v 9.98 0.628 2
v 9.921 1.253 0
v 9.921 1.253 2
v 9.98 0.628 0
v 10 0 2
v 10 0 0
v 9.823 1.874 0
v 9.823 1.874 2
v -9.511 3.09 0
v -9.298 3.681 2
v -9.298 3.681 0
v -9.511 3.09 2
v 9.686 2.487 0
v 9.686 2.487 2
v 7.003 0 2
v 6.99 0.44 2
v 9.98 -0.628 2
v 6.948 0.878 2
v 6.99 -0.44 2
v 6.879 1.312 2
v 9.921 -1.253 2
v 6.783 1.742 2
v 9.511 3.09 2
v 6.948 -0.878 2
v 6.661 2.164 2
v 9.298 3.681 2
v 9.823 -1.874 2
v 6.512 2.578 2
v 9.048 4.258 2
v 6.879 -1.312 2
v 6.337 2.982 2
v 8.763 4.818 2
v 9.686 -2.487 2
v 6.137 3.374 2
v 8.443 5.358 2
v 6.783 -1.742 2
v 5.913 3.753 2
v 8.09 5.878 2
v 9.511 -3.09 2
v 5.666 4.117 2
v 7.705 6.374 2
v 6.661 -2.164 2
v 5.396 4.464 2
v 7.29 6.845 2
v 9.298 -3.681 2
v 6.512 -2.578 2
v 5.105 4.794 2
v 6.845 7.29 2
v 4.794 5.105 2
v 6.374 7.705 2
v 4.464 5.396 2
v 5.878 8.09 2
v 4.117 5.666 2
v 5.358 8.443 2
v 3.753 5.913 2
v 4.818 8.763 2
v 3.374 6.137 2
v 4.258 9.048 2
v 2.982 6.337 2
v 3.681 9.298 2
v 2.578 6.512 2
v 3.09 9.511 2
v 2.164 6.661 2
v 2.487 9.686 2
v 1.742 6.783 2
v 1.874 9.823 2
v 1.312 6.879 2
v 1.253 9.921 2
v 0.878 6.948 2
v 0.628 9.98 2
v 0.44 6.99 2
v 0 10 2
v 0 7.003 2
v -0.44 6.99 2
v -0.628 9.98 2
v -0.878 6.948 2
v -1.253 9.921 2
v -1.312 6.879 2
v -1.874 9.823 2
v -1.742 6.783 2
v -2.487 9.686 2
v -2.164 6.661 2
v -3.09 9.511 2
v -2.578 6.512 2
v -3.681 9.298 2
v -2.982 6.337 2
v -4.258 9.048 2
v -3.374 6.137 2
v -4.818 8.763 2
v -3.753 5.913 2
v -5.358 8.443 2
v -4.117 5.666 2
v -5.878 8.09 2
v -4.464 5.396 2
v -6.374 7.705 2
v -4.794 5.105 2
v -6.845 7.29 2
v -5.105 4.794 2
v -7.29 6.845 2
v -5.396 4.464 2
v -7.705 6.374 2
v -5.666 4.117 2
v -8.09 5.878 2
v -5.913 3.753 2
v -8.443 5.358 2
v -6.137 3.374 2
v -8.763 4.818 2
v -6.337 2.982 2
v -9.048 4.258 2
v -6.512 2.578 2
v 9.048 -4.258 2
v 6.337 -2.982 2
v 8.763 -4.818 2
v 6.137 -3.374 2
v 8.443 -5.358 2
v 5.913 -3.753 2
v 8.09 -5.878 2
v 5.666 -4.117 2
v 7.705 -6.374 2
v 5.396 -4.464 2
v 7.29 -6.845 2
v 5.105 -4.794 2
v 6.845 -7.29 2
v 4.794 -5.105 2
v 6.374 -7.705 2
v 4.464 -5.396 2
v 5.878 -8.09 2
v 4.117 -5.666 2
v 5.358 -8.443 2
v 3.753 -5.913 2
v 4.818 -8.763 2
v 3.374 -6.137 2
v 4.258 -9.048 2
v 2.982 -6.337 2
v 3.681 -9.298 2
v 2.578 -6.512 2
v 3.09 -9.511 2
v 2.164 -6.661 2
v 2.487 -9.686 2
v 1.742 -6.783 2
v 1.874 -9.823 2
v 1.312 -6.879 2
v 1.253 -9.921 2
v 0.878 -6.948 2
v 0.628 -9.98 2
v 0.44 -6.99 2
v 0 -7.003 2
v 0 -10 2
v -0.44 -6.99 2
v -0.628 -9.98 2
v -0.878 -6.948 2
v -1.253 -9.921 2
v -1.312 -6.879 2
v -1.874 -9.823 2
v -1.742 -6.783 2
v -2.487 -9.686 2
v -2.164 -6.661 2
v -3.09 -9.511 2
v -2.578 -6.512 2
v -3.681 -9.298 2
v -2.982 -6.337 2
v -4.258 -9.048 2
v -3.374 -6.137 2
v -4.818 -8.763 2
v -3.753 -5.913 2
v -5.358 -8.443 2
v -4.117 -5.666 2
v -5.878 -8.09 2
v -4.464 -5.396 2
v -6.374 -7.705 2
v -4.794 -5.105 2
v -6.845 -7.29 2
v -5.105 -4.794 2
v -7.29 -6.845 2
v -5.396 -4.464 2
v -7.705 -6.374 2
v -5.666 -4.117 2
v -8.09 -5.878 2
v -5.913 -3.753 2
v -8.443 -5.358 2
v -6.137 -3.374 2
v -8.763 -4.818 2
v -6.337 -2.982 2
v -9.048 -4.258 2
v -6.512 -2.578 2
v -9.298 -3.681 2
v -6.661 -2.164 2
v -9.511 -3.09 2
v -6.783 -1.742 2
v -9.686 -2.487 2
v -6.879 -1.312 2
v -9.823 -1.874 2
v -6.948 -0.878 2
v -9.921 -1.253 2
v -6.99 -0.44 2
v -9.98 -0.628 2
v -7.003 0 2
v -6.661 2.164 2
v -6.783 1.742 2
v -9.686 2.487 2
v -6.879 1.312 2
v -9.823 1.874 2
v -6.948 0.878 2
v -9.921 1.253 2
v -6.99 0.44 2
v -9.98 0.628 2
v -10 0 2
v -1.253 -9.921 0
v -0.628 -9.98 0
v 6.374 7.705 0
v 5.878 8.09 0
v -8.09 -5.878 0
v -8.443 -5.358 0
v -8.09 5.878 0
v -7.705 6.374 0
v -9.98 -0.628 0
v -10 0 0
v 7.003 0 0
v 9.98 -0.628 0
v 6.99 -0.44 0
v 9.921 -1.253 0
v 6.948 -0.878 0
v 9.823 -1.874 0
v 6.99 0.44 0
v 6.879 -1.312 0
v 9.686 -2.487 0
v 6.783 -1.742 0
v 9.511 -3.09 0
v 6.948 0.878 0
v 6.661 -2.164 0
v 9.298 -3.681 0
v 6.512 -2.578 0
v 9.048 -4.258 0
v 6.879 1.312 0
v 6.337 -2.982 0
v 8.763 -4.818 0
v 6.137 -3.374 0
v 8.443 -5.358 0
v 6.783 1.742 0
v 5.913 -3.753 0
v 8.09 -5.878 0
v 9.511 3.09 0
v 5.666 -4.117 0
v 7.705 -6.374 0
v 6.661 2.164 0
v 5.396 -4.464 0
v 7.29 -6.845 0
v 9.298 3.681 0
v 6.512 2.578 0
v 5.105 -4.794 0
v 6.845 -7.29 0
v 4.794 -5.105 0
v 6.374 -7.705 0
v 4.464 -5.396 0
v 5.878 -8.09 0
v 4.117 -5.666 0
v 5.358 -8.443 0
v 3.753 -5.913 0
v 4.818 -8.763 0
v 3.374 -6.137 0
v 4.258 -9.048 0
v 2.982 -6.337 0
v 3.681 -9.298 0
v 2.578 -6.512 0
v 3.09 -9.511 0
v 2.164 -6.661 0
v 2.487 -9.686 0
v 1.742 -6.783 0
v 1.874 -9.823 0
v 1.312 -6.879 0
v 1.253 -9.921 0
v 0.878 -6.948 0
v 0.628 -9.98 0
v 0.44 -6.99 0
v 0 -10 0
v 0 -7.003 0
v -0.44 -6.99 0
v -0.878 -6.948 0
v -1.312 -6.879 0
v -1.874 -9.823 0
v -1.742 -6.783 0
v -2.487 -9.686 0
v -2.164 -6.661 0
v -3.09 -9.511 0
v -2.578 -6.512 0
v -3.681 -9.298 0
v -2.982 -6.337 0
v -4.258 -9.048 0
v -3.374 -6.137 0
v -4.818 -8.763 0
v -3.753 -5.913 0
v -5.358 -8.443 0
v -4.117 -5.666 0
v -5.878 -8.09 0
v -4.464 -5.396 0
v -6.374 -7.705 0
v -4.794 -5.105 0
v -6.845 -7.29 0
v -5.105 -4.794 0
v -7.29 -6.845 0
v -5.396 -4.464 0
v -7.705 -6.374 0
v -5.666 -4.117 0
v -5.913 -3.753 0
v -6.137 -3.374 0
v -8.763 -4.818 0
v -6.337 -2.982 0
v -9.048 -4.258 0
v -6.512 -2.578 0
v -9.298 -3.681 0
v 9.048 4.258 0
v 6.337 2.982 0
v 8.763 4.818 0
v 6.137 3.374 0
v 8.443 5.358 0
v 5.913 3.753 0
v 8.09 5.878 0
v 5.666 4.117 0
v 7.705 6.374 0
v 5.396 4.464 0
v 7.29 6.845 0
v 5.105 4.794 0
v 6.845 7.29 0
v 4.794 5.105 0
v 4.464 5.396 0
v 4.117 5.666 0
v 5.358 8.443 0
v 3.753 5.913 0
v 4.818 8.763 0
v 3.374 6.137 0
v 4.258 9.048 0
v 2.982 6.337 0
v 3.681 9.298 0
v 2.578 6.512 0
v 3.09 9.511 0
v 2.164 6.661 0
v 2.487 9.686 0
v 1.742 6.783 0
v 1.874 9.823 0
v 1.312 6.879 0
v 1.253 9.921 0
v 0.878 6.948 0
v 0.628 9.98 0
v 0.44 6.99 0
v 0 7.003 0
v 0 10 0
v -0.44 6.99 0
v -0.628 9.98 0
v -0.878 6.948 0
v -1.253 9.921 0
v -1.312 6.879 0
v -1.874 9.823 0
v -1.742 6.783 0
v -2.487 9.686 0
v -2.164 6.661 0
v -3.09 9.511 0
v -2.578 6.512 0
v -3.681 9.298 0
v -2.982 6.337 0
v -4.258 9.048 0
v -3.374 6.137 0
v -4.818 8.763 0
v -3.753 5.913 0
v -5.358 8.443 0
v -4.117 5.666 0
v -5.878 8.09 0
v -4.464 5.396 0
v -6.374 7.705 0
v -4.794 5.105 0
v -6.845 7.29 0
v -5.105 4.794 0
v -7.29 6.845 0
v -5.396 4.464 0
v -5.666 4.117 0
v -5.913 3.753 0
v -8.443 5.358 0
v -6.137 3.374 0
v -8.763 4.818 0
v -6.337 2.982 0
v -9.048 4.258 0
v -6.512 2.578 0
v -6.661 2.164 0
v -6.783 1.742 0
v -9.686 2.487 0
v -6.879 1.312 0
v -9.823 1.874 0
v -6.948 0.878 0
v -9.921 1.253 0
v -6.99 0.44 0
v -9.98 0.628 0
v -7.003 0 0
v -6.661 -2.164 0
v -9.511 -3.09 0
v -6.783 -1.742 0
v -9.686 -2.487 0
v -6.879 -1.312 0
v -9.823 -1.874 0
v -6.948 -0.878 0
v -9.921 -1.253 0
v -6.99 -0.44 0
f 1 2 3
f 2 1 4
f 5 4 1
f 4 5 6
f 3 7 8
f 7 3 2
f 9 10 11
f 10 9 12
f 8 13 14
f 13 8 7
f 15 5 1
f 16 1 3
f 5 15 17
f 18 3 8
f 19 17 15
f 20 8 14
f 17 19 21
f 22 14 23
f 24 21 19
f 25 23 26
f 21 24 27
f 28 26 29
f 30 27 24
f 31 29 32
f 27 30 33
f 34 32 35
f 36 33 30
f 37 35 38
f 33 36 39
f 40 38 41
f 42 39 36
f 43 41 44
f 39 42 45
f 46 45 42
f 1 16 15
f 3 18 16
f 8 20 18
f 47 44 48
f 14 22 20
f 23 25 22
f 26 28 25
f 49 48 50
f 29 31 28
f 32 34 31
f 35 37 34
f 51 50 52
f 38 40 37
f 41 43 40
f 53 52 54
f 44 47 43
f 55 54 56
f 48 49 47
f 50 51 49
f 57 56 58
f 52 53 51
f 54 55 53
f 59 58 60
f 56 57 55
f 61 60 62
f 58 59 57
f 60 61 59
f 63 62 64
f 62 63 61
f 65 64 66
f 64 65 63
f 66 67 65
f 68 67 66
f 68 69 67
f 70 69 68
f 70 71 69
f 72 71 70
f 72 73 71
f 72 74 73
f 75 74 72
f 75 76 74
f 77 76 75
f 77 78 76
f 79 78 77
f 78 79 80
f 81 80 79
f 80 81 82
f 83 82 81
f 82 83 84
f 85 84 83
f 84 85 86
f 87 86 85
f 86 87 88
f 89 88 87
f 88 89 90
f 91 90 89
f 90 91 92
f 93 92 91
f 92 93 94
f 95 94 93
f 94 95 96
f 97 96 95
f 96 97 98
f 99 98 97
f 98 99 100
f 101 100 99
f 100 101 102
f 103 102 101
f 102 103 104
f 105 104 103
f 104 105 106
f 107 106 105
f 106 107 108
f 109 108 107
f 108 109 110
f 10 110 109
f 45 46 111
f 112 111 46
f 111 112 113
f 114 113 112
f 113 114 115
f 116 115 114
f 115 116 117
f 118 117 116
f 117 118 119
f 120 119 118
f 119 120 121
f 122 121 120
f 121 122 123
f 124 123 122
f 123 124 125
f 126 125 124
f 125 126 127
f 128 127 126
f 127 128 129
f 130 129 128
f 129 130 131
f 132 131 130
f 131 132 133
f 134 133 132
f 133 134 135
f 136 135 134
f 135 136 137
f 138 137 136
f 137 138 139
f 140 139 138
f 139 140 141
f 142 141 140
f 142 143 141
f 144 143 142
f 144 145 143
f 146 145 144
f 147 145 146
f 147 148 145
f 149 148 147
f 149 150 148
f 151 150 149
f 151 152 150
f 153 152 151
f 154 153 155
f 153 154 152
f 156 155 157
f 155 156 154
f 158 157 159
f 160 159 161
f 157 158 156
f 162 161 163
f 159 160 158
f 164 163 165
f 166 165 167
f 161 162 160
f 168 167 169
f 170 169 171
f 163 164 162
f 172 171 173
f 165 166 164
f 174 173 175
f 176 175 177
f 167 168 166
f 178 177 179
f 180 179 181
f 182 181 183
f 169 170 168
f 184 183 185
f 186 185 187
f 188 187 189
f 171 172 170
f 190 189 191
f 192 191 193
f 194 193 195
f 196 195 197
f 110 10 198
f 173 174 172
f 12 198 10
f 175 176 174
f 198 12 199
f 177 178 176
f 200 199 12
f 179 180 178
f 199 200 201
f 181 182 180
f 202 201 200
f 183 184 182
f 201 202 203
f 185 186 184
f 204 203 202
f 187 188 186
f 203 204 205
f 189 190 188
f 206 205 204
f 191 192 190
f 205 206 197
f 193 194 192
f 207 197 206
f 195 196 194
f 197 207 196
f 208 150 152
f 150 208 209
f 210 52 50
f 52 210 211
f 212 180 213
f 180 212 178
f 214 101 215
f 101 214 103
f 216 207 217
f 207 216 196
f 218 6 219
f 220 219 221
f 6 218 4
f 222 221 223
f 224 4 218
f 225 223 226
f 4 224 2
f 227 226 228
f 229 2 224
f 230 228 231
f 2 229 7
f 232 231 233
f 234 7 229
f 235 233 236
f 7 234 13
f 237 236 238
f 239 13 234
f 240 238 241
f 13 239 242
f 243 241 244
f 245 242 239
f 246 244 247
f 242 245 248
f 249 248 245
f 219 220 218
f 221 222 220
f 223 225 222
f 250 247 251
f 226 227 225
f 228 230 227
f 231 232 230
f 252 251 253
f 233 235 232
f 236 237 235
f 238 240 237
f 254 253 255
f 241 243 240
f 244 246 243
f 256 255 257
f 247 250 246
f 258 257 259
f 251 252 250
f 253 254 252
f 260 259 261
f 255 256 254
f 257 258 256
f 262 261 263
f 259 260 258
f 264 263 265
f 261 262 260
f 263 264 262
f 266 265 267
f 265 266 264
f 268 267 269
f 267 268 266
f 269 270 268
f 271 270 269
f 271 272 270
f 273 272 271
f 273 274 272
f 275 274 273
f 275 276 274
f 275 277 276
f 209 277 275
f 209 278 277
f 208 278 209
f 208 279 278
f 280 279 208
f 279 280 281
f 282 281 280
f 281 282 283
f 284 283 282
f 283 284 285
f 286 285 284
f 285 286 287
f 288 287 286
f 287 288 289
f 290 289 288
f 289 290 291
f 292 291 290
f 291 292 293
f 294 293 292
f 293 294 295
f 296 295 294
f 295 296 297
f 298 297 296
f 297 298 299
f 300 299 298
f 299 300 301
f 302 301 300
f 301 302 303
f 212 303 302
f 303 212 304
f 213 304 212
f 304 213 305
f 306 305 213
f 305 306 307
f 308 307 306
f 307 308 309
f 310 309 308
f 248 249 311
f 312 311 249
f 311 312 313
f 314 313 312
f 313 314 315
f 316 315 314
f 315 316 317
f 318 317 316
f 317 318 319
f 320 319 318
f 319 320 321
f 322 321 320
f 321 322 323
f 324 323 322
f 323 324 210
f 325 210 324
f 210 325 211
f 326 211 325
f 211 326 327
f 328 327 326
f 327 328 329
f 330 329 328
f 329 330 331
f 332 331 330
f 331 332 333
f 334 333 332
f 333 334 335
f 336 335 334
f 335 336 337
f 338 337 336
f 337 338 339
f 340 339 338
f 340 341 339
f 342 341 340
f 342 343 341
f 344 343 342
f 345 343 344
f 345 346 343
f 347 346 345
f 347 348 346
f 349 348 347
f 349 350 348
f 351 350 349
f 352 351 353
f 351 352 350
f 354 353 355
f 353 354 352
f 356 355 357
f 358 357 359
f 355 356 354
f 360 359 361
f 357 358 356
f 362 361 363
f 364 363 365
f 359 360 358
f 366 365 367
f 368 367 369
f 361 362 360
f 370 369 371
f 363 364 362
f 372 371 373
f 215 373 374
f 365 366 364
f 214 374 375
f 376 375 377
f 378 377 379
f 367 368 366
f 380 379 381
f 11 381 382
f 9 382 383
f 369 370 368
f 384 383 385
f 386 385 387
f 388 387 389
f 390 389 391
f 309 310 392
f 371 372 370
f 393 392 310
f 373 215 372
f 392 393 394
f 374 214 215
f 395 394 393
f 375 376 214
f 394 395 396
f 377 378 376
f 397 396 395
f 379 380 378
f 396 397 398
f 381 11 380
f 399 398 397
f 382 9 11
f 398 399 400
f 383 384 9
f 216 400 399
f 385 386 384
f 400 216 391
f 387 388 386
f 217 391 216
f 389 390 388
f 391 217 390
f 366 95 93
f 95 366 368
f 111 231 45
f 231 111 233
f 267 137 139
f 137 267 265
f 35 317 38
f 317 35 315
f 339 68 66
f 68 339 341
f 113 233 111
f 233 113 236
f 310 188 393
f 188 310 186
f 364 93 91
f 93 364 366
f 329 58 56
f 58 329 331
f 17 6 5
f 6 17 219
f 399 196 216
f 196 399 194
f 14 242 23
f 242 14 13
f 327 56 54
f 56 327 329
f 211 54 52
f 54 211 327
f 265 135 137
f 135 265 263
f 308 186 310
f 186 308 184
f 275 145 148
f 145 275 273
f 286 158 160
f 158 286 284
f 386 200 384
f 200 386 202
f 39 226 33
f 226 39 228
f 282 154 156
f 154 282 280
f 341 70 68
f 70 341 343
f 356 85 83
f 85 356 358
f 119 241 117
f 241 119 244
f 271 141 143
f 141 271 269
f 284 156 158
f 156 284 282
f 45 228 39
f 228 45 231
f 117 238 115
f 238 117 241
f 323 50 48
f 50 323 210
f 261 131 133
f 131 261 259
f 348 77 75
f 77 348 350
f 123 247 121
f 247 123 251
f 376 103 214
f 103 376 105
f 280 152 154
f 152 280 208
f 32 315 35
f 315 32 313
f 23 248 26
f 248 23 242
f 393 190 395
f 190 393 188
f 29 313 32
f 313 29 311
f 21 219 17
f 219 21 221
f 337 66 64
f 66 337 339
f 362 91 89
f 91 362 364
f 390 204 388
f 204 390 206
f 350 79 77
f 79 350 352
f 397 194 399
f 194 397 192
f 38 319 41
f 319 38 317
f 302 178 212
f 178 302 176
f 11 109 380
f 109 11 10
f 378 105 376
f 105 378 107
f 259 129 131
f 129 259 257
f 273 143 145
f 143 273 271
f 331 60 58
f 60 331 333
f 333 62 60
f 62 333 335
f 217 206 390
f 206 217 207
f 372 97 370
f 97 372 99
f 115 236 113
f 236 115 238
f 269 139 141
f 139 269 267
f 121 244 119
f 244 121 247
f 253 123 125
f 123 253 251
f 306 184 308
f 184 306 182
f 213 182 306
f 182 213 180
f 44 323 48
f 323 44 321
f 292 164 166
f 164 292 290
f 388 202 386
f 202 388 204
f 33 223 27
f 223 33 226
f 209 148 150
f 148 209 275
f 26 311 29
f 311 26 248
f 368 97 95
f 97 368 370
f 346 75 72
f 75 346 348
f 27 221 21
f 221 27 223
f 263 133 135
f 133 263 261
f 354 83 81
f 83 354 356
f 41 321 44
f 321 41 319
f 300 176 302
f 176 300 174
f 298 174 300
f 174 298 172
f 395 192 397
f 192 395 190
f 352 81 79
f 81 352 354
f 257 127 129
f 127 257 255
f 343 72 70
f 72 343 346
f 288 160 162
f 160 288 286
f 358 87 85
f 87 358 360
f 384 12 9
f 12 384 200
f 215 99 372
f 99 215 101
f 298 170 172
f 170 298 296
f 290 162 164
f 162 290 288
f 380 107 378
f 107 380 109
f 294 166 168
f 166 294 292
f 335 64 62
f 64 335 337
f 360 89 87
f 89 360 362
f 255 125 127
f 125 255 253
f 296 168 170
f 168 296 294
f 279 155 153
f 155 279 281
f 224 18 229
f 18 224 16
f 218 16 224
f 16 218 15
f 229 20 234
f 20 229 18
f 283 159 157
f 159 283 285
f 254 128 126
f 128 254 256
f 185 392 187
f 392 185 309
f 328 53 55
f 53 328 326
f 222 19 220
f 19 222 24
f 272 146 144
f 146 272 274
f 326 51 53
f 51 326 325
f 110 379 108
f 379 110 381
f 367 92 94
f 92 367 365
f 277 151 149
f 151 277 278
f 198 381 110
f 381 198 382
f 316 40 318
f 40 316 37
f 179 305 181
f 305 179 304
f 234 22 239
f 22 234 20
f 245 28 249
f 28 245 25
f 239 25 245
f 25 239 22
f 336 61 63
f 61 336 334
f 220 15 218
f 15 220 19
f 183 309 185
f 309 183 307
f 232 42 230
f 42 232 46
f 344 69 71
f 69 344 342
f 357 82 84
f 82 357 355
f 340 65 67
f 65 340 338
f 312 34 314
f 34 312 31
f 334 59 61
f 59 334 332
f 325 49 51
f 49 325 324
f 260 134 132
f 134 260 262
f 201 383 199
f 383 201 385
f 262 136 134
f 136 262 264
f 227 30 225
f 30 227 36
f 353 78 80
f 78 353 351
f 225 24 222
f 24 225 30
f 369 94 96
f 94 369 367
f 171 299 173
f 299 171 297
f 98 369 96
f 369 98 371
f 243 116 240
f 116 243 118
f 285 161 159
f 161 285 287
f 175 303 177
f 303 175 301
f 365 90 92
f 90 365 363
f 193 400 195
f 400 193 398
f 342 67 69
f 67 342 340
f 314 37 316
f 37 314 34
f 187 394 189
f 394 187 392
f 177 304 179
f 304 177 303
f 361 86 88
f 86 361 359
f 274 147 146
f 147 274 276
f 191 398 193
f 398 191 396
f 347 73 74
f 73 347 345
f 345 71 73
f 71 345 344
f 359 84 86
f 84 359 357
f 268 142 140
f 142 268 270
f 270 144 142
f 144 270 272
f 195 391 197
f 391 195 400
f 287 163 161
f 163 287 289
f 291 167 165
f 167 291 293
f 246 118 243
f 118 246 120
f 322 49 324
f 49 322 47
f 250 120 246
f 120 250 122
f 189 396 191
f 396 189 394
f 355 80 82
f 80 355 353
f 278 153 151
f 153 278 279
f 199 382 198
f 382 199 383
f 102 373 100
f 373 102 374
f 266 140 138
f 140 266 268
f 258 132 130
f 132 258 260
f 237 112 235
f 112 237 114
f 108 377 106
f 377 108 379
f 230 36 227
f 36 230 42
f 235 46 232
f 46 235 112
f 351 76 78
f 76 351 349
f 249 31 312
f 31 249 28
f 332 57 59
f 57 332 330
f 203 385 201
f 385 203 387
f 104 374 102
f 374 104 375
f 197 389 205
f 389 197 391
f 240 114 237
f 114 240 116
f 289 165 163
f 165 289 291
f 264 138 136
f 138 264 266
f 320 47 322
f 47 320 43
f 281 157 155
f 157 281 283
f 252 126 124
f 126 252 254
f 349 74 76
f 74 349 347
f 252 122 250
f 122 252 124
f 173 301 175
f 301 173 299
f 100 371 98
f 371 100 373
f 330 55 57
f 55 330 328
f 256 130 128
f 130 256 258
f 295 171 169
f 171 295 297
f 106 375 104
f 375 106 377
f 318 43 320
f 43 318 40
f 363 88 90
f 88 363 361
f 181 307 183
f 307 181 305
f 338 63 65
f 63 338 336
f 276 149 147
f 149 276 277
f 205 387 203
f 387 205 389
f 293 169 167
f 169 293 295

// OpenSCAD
/*
    By Toke 2017-06-13
    Public domain
*/

outer_diam = 10;
inner_diam = 7;
height = 2;
fn = 100;

/*
    Circular spacer
*/
module spacer(height, outer, inner, fn=100) {
    
    // prevent undersizing (inner vs outer polygon)
    // See: https://en.wikibooks.org/wiki/OpenSCAD_User_Manual/undersized_circular_objects
    fudge = 1/cos(180/fn); // circumscribed

    difference() {
        cylinder(height, outer, outer, $fn=fn);
        
        translate([0, 0, -0.1])
        cylinder(height + 0.2, inner * fudge, inner * fudge, $fn=fn);
    }
}

spacer(height, outer_diam, inner_diam, fn);
